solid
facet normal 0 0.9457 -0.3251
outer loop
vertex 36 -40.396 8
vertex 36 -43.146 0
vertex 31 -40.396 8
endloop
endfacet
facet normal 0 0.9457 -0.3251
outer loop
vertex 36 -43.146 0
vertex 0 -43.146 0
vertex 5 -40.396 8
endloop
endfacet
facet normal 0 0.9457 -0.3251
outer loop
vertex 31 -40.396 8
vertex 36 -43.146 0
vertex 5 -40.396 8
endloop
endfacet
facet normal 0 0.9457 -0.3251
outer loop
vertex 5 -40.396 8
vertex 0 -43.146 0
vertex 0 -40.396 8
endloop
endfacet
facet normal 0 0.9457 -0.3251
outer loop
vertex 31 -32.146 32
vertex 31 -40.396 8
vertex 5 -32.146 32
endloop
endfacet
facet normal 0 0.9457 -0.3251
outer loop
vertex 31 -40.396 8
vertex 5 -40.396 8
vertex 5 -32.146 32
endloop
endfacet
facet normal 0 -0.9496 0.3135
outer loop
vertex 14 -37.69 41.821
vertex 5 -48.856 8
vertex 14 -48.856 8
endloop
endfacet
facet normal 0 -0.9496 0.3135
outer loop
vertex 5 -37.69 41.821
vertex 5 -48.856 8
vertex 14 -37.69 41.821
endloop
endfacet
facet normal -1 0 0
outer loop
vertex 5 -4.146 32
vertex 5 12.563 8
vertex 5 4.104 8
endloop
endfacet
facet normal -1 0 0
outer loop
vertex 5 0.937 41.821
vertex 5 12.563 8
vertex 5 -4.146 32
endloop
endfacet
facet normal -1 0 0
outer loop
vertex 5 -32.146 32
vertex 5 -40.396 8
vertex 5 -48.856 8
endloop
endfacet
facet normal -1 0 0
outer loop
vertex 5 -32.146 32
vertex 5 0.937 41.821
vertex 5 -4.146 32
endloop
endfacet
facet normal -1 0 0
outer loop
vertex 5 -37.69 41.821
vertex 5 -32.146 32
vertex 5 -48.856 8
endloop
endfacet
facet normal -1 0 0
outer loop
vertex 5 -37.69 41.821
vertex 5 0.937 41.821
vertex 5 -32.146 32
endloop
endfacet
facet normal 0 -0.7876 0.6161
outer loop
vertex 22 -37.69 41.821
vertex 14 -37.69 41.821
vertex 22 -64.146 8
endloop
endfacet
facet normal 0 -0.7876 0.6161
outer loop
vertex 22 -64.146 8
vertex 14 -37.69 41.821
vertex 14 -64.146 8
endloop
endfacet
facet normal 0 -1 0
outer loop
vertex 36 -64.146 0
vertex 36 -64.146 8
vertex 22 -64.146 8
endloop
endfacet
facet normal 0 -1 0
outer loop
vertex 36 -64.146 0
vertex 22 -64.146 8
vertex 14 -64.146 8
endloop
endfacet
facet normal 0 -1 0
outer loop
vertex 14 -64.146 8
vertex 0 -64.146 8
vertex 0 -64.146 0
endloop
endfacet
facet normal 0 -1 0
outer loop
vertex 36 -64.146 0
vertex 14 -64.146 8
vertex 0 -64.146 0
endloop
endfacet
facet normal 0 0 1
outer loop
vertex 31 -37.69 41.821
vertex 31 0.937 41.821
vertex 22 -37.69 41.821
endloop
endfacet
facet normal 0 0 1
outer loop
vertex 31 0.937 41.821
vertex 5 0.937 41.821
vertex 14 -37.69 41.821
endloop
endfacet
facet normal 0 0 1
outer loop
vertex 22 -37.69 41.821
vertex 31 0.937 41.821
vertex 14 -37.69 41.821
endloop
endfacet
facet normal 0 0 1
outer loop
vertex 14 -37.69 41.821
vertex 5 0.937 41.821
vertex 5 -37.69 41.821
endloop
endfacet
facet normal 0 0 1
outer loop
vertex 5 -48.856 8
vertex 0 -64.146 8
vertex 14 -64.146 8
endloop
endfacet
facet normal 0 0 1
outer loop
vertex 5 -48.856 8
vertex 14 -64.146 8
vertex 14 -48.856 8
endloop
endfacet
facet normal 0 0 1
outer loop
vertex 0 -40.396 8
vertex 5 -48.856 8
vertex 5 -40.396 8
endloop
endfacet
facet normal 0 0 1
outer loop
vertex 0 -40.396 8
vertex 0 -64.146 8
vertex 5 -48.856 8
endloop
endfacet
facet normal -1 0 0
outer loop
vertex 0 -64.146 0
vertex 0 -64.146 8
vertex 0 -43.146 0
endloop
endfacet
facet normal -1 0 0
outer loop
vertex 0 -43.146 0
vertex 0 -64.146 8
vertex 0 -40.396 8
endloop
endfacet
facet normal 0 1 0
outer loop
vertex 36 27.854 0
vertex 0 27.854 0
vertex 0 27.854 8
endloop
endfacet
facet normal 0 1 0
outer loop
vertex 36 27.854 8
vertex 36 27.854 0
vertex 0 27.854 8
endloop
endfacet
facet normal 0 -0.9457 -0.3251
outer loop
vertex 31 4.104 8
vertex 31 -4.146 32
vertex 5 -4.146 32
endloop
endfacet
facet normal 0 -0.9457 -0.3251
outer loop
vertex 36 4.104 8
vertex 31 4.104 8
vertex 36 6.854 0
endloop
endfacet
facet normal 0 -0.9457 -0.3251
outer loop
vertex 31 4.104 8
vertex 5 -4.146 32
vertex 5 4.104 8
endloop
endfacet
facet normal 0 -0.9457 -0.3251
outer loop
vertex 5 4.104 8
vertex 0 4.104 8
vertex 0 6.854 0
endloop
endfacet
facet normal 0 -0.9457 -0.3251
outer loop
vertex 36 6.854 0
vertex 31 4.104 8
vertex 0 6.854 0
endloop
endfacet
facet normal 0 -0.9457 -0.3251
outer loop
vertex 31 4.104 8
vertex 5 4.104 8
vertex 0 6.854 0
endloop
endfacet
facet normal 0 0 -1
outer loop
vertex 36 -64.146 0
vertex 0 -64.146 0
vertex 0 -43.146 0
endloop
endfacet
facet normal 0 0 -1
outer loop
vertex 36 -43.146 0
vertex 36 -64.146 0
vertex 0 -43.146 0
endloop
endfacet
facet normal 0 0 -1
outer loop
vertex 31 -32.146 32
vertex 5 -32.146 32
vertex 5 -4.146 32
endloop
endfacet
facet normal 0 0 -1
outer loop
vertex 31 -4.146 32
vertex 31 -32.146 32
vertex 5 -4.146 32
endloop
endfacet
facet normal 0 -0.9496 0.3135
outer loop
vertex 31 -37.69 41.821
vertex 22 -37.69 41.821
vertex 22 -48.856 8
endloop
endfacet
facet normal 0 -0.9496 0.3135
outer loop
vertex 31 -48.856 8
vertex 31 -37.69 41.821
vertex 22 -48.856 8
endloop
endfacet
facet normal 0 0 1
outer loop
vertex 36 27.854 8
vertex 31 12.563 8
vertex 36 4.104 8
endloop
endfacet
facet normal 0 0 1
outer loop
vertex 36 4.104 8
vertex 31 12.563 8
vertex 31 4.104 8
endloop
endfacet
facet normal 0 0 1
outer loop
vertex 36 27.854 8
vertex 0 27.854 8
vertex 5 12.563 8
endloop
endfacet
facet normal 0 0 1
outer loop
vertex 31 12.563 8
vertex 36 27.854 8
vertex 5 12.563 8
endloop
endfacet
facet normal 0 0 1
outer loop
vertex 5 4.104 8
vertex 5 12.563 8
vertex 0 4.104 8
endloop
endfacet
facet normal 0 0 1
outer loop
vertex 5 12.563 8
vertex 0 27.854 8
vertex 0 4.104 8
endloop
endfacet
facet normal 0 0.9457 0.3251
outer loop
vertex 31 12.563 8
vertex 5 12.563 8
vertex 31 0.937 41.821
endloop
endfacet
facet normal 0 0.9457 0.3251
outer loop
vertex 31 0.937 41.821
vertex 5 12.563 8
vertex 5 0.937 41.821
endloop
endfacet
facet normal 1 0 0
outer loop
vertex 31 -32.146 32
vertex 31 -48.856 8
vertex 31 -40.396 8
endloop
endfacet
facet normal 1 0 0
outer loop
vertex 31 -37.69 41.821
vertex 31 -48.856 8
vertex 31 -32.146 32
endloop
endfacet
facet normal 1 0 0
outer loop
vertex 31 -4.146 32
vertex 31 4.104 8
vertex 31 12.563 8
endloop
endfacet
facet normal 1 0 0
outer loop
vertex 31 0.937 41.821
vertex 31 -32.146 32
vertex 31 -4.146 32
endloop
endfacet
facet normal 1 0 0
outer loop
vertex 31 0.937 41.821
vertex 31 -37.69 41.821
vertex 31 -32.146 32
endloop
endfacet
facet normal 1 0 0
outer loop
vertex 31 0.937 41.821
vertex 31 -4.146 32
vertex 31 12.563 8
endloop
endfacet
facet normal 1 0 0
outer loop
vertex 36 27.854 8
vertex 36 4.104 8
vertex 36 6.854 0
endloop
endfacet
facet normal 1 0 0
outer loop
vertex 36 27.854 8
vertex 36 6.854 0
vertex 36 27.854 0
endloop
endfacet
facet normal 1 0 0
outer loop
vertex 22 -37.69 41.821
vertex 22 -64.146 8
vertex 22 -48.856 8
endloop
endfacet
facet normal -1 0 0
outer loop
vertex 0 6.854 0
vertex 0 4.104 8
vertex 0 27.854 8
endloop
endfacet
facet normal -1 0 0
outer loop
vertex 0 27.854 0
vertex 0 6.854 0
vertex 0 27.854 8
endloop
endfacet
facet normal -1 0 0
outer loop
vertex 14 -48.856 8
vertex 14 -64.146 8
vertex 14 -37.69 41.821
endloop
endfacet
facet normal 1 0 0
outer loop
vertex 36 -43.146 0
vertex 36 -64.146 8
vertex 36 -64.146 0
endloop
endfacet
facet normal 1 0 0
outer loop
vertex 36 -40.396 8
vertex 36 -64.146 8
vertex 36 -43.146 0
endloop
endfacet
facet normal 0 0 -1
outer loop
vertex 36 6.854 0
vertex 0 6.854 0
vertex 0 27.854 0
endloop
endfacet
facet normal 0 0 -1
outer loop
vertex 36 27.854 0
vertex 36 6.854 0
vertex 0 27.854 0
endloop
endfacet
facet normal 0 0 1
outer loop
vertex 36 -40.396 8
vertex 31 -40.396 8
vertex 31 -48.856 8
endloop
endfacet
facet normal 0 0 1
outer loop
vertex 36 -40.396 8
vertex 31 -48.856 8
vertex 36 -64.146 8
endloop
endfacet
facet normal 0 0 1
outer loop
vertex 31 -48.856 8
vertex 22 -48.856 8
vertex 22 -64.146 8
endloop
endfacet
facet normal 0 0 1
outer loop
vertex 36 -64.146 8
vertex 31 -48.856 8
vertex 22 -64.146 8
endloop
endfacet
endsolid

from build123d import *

# Parameters (mm, degrees)
F1_DEPTH = 36
F3_DEPTH = 5
F5_DEPTH = 5
F6_DEPTH = 22
F7_DEPTH = 14


with BuildPart() as f1:
    # F0 (on Right) → F1 (new body)
    with BuildSketch(Plane.YZ):
        Polygon((-64.146131, 8), (-64.146131, 0), (-43.146131, 0), (-32.146131, 32), (-4.146131, 32), (6.853869, 0), (27.853869, 0), (27.853869, 8), (12.563331, 8), (0.937467, 41.820695), (-28.062533, 41.820695), (-37.689707, 41.820695), (-48.855593, 8), align=None)
    extrude(amount=F1_DEPTH)

    # F2 (on face) → F3 (cut)
    with BuildSketch(Plane.YZ.offset(36)):
        Polygon((-37.689707, 41.820695), (-48.855593, 8), (-40.396131, 8), (-32.146131, 32), (-4.146131, 32), (4.103869, 8), (12.563331, 8), (0.937467, 41.820695), align=None)
    extrude(amount=-F3_DEPTH, mode=Mode.SUBTRACT)

    # F4 (on face) → F5 (cut)
    with BuildSketch(Plane(origin=(0, 0, 0), x_dir=(0, -1, 0), z_dir=(-1, 0, 0))):
        Polygon((-0.937467, 41.820695), (-12.563331, 8), (-4.103869, 8), (4.146131, 32), (32.146131, 32), (40.396131, 8), (48.855593, 8), (37.689707, 41.820695), align=None)
    extrude(amount=-F5_DEPTH, mode=Mode.SUBTRACT)

    # F0 (on Right) → F6 (join)
    with BuildSketch(Plane.YZ):
        Polygon((-37.689707, 41.820695), (-64.146131, 8), (-48.855593, 8), align=None)
    extrude(amount=F6_DEPTH)

    # F0 (on Right) → F7 (cut)
    with BuildSketch(Plane.YZ):
        Polygon((-37.689707, 41.820695), (-64.146131, 8), (-48.855593, 8), align=None)
    extrude(amount=F7_DEPTH, mode=Mode.SUBTRACT)


solid = f1.part
